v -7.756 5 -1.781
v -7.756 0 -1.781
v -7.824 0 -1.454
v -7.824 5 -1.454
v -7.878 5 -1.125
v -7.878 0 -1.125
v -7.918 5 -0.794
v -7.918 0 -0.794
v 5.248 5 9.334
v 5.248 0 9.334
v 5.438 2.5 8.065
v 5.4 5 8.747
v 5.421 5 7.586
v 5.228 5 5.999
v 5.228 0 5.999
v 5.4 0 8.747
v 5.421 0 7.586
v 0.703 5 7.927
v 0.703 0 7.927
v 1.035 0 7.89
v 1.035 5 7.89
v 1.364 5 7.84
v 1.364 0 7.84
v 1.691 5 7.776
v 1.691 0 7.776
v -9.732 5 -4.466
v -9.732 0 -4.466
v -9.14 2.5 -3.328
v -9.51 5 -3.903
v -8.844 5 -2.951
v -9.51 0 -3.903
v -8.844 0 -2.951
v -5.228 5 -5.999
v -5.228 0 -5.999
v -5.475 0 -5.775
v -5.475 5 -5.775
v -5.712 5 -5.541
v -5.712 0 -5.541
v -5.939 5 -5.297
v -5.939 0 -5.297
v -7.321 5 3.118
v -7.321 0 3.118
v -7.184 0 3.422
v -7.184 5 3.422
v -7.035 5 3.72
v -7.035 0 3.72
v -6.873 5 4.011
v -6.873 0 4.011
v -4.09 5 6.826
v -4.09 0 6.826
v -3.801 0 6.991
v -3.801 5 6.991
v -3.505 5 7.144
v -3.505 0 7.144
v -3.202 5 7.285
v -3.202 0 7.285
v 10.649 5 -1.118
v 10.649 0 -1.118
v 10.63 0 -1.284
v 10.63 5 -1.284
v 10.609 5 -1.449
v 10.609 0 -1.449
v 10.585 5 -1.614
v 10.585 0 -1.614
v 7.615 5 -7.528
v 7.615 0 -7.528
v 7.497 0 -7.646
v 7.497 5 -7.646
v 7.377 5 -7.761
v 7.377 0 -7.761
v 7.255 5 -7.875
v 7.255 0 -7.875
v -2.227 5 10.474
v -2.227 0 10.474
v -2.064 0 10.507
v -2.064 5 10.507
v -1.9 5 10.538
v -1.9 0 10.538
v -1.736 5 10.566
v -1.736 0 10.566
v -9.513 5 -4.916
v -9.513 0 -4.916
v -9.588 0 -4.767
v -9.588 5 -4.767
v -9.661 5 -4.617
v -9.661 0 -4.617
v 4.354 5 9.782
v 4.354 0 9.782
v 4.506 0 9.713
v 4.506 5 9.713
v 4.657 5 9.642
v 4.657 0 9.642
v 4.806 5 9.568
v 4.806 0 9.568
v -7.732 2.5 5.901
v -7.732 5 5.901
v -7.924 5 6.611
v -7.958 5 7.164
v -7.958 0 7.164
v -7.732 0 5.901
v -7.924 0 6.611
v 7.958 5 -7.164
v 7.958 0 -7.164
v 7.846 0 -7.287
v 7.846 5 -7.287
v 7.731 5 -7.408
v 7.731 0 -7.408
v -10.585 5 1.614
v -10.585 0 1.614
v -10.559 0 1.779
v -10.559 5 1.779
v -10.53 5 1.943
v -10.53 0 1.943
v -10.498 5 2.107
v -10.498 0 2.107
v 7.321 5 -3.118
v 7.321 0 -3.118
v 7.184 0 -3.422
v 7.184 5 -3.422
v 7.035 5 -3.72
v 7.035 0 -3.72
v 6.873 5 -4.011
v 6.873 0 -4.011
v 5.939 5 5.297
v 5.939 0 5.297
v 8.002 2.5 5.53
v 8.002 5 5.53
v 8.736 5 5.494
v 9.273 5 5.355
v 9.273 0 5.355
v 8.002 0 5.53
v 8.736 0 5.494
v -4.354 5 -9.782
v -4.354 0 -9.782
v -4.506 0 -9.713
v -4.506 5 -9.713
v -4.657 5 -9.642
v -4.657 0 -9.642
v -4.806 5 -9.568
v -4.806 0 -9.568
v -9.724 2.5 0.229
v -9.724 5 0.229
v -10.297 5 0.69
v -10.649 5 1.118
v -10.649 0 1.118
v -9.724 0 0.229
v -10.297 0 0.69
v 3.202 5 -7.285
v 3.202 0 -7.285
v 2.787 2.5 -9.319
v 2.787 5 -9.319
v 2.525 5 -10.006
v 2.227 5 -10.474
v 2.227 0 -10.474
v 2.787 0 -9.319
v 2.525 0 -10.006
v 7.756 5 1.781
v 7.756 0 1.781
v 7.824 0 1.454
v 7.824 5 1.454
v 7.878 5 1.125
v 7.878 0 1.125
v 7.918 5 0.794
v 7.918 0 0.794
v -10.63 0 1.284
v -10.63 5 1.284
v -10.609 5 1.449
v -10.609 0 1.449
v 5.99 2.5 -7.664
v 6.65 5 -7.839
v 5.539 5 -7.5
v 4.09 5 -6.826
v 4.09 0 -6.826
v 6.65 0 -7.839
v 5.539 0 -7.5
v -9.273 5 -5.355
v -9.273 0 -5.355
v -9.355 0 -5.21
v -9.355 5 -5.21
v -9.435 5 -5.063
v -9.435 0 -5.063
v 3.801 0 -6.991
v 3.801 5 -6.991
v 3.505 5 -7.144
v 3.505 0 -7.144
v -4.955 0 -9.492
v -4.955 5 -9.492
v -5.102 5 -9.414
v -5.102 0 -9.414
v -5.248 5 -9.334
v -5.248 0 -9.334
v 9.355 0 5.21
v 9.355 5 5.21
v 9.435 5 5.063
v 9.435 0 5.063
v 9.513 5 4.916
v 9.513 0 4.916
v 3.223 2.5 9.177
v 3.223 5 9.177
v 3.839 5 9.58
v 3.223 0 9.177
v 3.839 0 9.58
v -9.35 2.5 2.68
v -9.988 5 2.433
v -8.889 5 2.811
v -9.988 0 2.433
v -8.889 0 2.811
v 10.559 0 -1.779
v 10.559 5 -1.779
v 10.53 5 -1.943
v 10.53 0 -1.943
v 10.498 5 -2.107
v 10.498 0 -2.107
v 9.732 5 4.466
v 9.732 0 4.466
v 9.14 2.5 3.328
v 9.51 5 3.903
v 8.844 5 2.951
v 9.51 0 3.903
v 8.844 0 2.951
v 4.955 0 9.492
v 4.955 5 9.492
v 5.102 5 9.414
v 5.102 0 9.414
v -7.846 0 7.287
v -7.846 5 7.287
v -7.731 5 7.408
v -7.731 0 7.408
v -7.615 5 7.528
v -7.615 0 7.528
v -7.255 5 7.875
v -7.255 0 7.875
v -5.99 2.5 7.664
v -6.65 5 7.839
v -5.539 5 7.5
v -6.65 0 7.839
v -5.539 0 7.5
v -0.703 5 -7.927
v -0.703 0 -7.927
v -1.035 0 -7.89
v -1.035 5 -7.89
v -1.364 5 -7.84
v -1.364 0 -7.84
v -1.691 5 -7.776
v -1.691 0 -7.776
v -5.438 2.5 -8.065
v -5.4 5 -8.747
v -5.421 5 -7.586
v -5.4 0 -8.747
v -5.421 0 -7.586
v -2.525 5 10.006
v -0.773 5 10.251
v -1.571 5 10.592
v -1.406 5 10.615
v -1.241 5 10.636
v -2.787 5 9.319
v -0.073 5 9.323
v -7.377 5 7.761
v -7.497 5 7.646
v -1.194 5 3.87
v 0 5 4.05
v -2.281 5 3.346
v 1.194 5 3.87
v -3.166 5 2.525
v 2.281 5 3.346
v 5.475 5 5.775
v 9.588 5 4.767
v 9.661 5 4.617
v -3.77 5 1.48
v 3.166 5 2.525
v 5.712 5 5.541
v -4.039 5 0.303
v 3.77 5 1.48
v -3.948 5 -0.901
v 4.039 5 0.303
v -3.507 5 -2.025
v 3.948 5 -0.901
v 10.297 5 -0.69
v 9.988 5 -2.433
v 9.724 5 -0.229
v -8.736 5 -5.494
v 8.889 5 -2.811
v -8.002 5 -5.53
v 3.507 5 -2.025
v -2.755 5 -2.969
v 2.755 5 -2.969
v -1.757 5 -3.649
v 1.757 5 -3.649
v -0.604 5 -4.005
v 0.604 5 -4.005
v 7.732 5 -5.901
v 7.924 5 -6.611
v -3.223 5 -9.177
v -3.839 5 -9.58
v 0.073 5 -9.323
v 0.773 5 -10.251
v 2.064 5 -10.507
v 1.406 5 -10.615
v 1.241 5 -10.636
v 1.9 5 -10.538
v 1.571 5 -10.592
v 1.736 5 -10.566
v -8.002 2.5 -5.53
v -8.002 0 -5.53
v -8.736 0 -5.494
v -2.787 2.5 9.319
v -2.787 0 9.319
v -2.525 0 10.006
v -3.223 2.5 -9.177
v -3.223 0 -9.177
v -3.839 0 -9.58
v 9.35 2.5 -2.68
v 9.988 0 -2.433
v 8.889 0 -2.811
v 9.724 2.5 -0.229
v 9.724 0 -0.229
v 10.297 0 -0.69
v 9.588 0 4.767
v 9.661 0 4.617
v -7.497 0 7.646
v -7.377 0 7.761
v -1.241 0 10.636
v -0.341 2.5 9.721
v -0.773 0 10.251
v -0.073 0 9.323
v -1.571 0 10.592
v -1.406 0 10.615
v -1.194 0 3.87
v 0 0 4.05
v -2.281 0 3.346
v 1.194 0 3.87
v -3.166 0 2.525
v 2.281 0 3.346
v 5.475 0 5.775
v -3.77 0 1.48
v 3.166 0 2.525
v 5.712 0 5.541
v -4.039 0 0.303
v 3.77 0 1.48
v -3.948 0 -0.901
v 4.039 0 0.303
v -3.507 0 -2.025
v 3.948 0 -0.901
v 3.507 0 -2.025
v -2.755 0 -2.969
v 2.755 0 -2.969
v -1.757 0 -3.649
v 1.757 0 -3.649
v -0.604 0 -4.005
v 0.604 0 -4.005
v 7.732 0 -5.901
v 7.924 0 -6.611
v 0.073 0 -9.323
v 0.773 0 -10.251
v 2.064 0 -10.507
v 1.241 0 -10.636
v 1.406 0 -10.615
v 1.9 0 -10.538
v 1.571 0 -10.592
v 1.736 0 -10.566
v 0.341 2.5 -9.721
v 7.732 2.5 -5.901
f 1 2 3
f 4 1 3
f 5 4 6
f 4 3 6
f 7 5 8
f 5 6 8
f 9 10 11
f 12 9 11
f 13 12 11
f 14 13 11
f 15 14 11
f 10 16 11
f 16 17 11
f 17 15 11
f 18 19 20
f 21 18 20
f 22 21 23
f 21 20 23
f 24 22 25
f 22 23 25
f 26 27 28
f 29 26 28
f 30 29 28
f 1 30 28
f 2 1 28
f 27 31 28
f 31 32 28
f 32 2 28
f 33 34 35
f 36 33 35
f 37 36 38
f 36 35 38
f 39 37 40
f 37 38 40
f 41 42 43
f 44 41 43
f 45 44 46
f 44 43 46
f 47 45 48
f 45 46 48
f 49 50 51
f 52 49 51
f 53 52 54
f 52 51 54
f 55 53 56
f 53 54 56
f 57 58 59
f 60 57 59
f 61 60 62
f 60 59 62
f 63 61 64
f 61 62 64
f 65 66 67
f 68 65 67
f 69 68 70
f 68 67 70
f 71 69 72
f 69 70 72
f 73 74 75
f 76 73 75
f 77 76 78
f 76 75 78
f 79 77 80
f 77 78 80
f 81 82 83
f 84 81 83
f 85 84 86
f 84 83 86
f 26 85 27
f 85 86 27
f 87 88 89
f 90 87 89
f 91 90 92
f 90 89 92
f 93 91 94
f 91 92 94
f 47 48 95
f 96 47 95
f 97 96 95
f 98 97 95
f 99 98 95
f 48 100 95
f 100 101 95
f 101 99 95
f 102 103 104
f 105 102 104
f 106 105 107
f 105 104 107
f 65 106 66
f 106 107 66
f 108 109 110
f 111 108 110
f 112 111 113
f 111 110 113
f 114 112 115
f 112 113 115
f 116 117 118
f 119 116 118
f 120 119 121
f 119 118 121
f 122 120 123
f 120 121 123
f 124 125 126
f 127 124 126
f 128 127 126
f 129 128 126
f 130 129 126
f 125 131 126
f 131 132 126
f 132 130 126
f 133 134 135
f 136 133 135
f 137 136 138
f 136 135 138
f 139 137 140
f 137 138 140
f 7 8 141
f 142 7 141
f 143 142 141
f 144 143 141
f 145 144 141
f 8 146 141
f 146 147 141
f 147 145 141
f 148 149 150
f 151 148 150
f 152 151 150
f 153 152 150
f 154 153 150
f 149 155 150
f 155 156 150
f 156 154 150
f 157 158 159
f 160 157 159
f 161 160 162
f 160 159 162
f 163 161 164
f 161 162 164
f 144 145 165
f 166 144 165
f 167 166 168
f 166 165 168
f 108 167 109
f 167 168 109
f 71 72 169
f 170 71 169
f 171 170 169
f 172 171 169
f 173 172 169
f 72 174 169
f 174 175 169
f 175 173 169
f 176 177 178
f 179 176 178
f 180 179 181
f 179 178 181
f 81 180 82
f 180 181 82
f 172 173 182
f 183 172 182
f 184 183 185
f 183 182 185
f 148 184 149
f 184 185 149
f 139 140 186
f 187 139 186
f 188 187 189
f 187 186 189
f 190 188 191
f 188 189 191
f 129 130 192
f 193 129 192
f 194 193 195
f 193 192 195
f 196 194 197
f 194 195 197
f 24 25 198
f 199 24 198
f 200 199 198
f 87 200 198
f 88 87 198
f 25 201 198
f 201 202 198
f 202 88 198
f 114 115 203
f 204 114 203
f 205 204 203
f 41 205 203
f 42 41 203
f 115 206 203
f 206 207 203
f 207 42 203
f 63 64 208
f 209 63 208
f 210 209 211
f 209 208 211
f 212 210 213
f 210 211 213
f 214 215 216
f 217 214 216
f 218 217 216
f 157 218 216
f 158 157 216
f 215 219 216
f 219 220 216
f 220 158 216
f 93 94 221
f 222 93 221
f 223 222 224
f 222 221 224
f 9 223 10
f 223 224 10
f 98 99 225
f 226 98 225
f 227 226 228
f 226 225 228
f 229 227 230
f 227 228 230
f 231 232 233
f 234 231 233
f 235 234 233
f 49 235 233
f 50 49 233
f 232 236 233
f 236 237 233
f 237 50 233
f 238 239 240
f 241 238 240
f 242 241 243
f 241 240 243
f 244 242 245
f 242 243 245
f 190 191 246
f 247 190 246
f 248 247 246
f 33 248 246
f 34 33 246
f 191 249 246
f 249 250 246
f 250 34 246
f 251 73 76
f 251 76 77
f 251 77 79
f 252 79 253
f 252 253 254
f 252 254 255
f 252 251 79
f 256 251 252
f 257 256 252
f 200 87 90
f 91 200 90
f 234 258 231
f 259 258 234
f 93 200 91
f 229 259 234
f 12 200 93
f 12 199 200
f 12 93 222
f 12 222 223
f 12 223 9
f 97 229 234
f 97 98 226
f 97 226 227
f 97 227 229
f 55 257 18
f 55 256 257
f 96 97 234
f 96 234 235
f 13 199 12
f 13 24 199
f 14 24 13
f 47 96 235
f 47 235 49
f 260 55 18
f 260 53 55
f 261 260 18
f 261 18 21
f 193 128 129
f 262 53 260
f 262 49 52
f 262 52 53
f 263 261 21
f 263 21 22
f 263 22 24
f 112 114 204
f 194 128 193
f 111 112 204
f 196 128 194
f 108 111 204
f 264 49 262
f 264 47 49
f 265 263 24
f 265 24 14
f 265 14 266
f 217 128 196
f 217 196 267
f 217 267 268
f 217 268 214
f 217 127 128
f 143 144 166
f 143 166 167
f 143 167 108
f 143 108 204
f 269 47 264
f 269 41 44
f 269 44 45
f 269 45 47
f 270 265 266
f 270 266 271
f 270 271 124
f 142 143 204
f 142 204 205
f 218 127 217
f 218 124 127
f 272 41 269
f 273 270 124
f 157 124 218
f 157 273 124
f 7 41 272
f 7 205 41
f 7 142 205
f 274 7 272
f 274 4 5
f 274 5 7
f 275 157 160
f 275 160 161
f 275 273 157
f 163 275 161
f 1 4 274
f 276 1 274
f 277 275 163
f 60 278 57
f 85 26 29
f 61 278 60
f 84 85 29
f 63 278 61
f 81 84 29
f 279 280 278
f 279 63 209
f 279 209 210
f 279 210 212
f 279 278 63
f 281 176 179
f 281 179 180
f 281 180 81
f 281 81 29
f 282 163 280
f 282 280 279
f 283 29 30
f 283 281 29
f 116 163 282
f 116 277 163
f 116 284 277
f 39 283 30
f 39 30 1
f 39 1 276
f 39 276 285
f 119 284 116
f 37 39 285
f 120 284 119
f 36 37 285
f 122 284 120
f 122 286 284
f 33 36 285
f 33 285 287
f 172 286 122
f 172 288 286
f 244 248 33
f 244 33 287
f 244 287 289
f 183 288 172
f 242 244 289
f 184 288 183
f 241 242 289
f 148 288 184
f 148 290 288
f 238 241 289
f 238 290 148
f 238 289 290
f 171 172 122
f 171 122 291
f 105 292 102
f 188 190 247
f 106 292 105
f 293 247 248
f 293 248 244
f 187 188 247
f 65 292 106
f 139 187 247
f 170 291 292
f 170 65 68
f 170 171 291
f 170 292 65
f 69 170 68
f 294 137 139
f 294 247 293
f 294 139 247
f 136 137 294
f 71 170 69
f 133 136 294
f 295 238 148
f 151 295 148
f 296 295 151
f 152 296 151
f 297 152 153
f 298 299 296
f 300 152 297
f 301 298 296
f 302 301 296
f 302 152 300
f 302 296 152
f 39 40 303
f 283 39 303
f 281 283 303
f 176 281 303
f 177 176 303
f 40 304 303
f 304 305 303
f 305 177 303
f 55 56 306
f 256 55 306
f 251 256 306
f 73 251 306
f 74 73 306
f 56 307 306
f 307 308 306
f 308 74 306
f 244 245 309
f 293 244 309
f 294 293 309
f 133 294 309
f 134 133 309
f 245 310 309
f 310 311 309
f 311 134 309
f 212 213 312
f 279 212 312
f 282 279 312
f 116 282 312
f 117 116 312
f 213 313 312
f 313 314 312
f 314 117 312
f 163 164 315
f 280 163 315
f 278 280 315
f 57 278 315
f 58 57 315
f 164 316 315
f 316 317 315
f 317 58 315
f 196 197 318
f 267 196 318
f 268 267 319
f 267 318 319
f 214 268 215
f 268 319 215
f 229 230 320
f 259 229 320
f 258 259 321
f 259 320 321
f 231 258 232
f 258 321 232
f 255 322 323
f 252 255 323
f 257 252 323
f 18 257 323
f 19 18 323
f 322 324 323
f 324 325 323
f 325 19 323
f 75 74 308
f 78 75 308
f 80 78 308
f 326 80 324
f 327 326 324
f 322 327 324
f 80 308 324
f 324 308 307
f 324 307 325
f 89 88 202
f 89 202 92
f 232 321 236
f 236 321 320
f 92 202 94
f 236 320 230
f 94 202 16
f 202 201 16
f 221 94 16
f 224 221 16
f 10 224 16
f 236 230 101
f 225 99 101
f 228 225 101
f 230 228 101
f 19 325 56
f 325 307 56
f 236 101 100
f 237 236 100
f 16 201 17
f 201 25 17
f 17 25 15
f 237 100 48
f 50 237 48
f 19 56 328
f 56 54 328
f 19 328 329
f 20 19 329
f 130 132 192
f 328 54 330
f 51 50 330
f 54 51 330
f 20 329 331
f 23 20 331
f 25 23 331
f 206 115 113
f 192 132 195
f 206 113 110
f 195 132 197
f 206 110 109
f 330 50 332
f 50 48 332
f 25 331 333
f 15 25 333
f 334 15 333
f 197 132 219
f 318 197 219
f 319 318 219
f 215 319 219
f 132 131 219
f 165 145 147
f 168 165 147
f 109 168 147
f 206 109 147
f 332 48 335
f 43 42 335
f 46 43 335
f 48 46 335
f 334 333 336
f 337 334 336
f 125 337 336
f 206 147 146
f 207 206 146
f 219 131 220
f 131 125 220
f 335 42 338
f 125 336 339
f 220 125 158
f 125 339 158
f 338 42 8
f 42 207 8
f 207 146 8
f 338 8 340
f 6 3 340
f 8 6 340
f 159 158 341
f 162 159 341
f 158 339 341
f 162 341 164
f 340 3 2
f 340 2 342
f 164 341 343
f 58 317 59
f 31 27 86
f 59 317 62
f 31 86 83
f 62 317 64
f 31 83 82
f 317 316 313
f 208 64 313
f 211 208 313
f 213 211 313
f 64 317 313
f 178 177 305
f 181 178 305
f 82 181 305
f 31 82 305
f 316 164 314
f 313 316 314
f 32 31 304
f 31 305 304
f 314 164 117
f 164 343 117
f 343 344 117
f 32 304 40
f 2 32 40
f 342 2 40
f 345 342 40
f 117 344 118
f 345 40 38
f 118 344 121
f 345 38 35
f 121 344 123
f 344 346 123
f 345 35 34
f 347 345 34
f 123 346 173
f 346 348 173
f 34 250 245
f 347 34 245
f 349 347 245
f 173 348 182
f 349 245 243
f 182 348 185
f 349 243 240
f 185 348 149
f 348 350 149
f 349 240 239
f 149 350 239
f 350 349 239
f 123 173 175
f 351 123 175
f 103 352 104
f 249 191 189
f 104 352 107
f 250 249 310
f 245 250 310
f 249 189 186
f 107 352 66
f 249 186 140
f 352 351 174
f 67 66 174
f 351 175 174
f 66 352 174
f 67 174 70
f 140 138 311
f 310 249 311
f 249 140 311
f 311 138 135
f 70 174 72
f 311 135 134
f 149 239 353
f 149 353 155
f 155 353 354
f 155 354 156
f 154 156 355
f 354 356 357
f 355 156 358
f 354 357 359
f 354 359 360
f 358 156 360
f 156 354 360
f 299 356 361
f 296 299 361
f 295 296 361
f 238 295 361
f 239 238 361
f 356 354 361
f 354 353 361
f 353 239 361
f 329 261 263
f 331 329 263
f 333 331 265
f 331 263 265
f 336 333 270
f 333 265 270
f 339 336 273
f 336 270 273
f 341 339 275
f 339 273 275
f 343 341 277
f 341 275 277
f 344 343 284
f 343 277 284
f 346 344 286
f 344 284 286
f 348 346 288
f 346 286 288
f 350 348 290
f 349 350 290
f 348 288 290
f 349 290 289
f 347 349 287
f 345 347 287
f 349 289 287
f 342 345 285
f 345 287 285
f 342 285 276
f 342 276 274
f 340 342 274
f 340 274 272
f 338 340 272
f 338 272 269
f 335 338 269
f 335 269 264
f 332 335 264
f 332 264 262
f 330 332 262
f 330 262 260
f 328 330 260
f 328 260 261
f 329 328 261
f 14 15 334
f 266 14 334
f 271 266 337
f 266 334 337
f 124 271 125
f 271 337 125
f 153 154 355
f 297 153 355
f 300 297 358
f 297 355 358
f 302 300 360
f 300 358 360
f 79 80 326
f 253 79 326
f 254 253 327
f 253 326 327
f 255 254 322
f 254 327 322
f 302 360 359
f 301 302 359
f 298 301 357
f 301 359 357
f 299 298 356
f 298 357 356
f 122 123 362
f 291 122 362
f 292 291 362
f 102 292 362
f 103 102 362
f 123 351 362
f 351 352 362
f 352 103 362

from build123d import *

# Parameters (mm, degrees)
SKETCH1_R           = 7.957747155
BOSS_EXTRUDE4_DEPTH = 5
CIRPATTERN6_COUNT   = 10
SKETCH2_R           = 4.05
CUT_EXTRUDE1_DEPTH  = 10


with BuildPart() as part:
    # Sketch1 → Boss-Extrude4 (new body)
    with BuildSketch(Plane(origin=(0, 0, 0), x_dir=(1, 0, 0), z_dir=(0, 1, 0))):
        Circle(SKETCH1_R)
        with BuildLine():
            ThreePointArc((7.958110252, 7.164089255), (7.788629845, 7.347988758), (7.614900879, 7.527880064))
            ThreePointArc((7.614900879, 7.527880064), (7.43701812, 7.703665045), (7.255078601, 7.875247815))
            add(Edge.make_bspline(
                [(7.255078601, 7.875247815), (6.306550312, 7.97741942), (4.090117658, 6.826175893)],
                knots=[0.62632571, 0.62632571, 0.62632571, 1, 1, 1], degree=2))
            ThreePointArc((4.090117658, 6.826175893), (5.659220003, 5.594548126), (6.872732742, 4.011394325))
            add(Edge.make_bspline(
                [(6.872732742, 4.011394325), (8.04937368, 6.214449356), (7.958110252, 7.164089255)],
                knots=[0, 0, 0, 0.37367429, 0.37367429, 0.37367429], degree=2))
        make_face()
    boss_extrude4 = extrude(amount=BOSS_EXTRUDE4_DEPTH)

    # CirPattern6: Boss-Extrude4 ×10 about axis
    cirpattern6_axis = Axis((0, 0, 0), (0, -1, 0))
    for i in range(1, CIRPATTERN6_COUNT):
        add(boss_extrude4.rotate(cirpattern6_axis, i * 360 / CIRPATTERN6_COUNT))

    # Sketch2 → Cut-Extrude1 (cut)
    with BuildSketch(Plane(origin=(0, 5, 0), x_dir=(1, 0, 0), z_dir=(0, 1, 0))):
        with Locations(Location((0, 0, 0), (0, 0, 270))):
            Circle(SKETCH2_R)
    extrude(amount=-CUT_EXTRUDE1_DEPTH, mode=Mode.SUBTRACT)


solid = part.part
